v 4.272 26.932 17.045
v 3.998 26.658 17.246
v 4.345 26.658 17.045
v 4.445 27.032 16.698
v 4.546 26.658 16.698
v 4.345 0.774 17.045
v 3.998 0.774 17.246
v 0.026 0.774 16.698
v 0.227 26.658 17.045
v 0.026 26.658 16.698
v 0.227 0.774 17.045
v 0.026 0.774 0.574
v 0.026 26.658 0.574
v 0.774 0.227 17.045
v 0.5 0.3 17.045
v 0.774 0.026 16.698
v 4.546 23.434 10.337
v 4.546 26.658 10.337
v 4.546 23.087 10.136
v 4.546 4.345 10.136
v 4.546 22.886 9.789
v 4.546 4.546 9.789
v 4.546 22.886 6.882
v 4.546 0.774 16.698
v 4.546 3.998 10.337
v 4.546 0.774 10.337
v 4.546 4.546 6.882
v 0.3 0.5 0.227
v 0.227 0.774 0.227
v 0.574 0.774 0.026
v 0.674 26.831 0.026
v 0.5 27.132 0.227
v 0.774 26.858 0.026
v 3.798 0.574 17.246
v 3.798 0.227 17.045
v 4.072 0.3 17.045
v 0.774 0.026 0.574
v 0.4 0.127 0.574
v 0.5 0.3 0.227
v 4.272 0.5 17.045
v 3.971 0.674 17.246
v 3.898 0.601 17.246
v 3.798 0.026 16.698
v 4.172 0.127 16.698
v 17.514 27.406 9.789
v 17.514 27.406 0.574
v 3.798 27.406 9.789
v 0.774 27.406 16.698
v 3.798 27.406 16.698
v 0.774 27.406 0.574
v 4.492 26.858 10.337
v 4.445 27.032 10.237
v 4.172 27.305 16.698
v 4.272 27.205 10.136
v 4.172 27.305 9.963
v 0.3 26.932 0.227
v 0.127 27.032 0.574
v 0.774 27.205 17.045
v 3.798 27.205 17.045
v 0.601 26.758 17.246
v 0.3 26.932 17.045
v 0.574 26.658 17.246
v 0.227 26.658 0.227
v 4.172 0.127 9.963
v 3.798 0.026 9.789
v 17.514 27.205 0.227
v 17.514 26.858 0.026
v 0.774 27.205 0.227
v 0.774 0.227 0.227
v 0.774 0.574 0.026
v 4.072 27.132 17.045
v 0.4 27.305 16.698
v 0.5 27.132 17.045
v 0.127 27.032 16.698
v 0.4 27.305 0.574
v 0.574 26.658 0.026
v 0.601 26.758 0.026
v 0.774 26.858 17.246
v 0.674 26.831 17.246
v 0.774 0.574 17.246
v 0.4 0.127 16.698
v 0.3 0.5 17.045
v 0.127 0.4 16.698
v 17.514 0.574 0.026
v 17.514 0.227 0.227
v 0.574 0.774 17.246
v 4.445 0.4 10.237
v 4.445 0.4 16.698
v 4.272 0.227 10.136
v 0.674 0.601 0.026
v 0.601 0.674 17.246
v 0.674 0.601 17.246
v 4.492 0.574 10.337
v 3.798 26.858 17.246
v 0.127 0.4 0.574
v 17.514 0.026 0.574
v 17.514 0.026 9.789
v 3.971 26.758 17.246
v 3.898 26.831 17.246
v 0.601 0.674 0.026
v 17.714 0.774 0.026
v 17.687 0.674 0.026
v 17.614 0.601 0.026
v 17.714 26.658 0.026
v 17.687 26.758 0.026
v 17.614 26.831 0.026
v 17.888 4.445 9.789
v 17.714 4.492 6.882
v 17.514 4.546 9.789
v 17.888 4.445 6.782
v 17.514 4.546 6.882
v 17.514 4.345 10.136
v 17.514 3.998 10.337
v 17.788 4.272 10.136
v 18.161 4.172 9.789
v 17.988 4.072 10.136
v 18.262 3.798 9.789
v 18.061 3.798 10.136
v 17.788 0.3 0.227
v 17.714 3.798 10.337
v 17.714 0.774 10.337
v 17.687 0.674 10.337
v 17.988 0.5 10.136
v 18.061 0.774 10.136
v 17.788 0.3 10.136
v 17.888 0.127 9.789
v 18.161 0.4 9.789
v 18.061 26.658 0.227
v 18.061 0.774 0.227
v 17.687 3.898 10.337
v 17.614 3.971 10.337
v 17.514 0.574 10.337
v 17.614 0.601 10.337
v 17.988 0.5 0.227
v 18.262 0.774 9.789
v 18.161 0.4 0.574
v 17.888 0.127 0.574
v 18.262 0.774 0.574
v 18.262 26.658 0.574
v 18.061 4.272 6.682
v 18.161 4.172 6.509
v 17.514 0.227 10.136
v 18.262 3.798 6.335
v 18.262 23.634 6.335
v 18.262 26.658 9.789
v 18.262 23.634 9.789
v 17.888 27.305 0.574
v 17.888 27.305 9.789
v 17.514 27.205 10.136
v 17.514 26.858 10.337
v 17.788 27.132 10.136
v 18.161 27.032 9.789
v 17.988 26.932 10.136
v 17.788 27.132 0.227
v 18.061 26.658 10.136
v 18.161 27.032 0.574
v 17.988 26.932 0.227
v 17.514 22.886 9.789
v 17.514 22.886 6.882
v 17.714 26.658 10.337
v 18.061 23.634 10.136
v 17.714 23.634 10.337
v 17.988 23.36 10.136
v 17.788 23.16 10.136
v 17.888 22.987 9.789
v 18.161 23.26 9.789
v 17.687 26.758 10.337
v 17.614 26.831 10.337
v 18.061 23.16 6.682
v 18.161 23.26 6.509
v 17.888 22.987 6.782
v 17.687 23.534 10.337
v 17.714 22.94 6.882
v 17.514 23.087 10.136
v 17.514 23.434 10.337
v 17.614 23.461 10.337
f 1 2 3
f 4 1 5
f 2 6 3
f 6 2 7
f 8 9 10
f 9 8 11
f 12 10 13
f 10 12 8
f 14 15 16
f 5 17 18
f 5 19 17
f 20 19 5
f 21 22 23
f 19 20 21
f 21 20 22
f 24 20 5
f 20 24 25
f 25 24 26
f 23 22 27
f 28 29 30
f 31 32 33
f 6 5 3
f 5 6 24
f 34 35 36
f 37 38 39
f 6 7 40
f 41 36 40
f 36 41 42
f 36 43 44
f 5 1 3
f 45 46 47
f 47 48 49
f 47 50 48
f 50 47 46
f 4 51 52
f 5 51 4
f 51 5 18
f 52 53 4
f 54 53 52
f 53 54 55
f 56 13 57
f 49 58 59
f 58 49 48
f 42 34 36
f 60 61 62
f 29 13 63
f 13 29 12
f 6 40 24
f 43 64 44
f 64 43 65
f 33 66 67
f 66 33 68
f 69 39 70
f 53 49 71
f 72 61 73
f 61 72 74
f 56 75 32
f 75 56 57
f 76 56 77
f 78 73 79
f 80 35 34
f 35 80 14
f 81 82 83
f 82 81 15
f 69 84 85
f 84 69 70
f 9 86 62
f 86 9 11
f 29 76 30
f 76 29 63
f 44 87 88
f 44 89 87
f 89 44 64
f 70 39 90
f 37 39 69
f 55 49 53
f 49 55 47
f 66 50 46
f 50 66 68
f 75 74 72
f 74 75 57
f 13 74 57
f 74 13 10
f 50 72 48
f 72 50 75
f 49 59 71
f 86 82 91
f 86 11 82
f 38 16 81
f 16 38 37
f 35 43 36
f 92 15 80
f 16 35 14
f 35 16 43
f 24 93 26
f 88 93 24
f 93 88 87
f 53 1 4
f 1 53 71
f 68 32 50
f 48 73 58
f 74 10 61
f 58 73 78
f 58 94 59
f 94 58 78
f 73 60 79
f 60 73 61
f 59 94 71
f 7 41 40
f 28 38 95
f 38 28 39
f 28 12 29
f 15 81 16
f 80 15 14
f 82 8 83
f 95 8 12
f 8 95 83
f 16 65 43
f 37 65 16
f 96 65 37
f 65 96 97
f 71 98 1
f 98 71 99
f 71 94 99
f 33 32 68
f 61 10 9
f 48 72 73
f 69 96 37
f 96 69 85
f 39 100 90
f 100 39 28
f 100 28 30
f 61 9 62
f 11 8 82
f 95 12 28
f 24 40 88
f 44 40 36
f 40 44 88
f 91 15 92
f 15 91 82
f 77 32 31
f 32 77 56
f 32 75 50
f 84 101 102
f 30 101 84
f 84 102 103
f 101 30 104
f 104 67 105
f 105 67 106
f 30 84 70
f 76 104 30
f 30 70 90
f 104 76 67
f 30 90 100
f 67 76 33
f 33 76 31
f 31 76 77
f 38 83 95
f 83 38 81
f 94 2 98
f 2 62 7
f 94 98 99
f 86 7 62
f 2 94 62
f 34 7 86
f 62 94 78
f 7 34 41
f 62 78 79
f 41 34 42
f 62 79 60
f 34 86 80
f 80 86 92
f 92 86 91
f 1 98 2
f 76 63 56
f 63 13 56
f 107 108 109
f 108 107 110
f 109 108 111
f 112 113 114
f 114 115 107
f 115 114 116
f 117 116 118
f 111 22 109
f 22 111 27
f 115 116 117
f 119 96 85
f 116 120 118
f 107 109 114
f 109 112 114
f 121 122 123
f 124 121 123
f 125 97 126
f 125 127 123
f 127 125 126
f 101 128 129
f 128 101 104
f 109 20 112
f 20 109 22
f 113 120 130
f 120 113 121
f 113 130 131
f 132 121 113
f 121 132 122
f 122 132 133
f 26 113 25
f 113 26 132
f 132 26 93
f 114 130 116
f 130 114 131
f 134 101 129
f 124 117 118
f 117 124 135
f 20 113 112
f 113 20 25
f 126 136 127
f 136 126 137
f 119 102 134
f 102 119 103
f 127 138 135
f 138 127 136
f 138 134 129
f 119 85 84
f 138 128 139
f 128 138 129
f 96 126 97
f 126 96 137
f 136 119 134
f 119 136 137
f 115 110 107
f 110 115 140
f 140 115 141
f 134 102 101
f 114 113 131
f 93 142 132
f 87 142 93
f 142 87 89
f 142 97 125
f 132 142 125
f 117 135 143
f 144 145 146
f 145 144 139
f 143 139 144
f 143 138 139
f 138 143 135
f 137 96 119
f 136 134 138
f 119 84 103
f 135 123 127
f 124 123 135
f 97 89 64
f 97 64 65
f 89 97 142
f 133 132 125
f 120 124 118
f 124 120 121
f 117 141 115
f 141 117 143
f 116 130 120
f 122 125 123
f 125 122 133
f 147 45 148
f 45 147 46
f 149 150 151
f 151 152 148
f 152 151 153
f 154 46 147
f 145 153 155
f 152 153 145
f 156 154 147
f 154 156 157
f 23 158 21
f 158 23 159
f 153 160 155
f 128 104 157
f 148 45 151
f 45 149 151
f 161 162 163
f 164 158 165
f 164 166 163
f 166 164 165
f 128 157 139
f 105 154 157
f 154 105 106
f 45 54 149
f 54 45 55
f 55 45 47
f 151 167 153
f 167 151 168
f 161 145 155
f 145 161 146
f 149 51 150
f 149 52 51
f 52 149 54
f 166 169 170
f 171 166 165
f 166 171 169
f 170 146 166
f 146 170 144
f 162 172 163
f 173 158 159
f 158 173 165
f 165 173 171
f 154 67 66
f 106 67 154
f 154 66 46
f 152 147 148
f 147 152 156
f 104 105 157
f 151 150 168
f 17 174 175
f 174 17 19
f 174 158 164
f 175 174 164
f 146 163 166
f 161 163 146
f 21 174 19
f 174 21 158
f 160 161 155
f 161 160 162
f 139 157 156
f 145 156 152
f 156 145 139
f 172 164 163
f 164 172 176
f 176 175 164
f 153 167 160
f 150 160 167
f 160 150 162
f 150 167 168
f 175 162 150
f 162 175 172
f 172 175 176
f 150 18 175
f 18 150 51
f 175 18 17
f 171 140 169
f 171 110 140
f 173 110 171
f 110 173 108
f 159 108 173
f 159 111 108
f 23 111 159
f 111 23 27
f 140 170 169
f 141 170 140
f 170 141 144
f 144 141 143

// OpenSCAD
// mathgrrl parametrizable furniture
// CODE FOR THINGIVERSE CUSTOMIZER

////////////////////////////////////////////////////////////////////////////

/* [Units and Scaling] */

// Choose the type of units that you will use to measure your actual room and objects.
units = 25.4; // [25.4:Inches,304.8:Feet,10:Centimeters,1000:Meters]

// Choose the scale of your models. For example "50" means 1:50 scale, with models whose linear dimensions are 1/50th of their actual size.
scale = 50;  

// Invisible parameters
$fn = 1*12; 	// facets
s = units/scale;	// scaling factor 
soft = 3*s;	// radius for soft bevels depends on scale
sharp = 1*.2; 	// radius for sharper edges

////////////////////////////////////////////////////////////////////////////

/* [Furniture Type] */

//Choose a type of custom or stock furniture from ONE of the four menus below. Enter your custom dimensions on the next tab. Stock models come with their own dimensions.
custom_furniture = 0; //	[0:None,1:Bookcase in my dimensions,2:Table in my dimensions,3:Desk in my dimensions,4:Corner Desk in my dimensions,5:Chair in my dimensions,6:Stool in my dimensions,7:Sofa in my dimensions,8:Sofa Bed in my dimensions,9:Ottoman in my dimensions,10:Bed in my dimensions,11:Bed Frame in my dimensions,12:Bureau in my dimensions,13:Rug in my dimensions,14:Lamp in my dimensions,15:Tree in my dimensions,16:Arcade in my dimensions,17:Clearance token in my dimensions]

// 
stock_bookcase_selection = 100; // [100:None,101:Wide short IKEA Billy bookcase,102:Wide short extended IKEA Billy bookcase,103:Wide tall IKEA Billy Bookcase,104:Wide tall extended IKEA Billy bookcase,105:Wide tall deep IKEA Billy bookcase,106:Thin short IKEA Billy bookcase,107:Thin short extended IKEA Billy bookcase,108:Thin tall IKEA Billy bookcase,109:Thin tall extended IKEA Billy bookcase,110:Wide tall IKEA Hemnes bookcase,111:Thin tall IKEA Hemnes bookcase,112:Wide tall IKEA Bonde bookcase,113:Thin tall IKEA Bonde bookcase]

// 
stock_bed_selection = 300; // [300:None,301:Twin matrress,302:Frame for twin mattress,303:Full mattress,304:Frame for full mattress,305:Queen mattress,306:Frame for queen mattress,307:King mattress,308:Frame for king mattress,309:IKEA Karlstad sofa bed]

// 
other_stock_selection = 516; // [500:None,501:Small dining table,502:Medium dining table,503:Coffee table,504:Square coffee table,505:Kid's desk,506:Large desk,507:Long desk,508:TV stand,509:Tiny endtable,510:Medium endtable,511:Large endtable,512:Dining chair,513:Office chair,514:Kitchen stool,515:Large sofa,516:Small loveseat,517:Armchair,518:Kid's bureau,519:Large rug,520:Standing lamp,521:Decorative tree,522:Galaga/PacMan arcade,523:Thin clearance token,524:Wide clearance token]

////////////////////////////////////////////////////////////////////////////

/* [Dimensions] */

// What is the length of your object from side to side? (The model may appear on its back or side; answer in terms of the real-life object.)
length = 30;

// What is the depth of your object from front to back?
depth = 30;

// What is the height of your object from bottom to top?
height = 30;

// If your object is a stool, tree, or lamp then enter radius here to be used instead of length and depth.
radius = 7;

// If your object is a bookcase, how many shelves does it have?
shelves = 4;

// If your object is a bureau, how many levels of drawers does it have?
drawers = 4;

// If your object is a chair, which type of chair is it?
chair_type = 1000; // [1000:Straight,1001:Rolling]

// If your object is a sofa bed, what is its depth when fully extended?
sofabed_depth = 65;

////////////////////////////////////////////////////////////////////////////
// choose and render the furntiture model //////////////////////////////////

furniture(); // build it!

module furniture(){

	// custom designs with user dimensions
	if (custom_furniture==1) bookcase(depth,length,height,shelves);
	if (custom_furniture==2) table(depth,length,height);
	if (custom_furniture==3) desk(depth,length,height);
	if (custom_furniture==4) cornerdesk(depth,length,height);
	if (custom_furniture==5) chair(depth,length,height,chair_type);
	if (custom_furniture==6) stool(radius,height);
	if (custom_furniture==7) sofa(depth,length,height);
	if (custom_furniture==8) sofabed(depth,sofabed_depth,length,height);
	if (custom_furniture==9) ottoman(depth,length,height);
	if (custom_furniture==10) bed(depth,length,height);
	if (custom_furniture==11) bedframe(depth,length,height);
	if (custom_furniture==12) bureau(depth,length,height,drawers);
	if (custom_furniture==13) rug(width,length);
	if (custom_furniture==14) lamp(radius,height);
	if (custom_furniture==15) tree(radius,height);
	if (custom_furniture==16) arcade(depth,length,height);
	if (custom_furniture==17) clearance_star(length,height);

	// pre-made bookcases
	if (stock_bookcase_selection==101) bookcase(depth=11,length=31.5,height=41.75,shelves=3);
	if (stock_bookcase_selection==102) bookcase(depth=11,length=31.5,height=55.375,shelves=4);
	if (stock_bookcase_selection==103) bookcase(depth=11,length=31.5,height=79.5,shelves=6);
	if (stock_bookcase_selection==104) bookcase(depth=11,length=31.5,height=93.125,shelves=7);
	if (stock_bookcase_selection==105) bookcase(depth=15.375,length=31.5,height=79.5,shelves=6);
	if (stock_bookcase_selection==106) bookcase(depth=11,length=15.75,height=41.75,shelves=3);
	if (stock_bookcase_selection==107) bookcase(depth=11,length=15.75,height=55.375,shelves=4);
	if (stock_bookcase_selection==108) bookcase(depth=11,length=15.75,height=79.5,shelves=6);
	if (stock_bookcase_selection==109) bookcase(depth=11,length=15.75,height=93.125,shelves=7);
	if (stock_bookcase_selection==110) bookcase(depth=13.5,length=35.5,height=78,shelves=6);
	if (stock_bookcase_selection==111) bookcase(depth=13.5,length=19.5,height=78,shelves=6);
	if (stock_bookcase_selection==112) bookcase(depth=16,length=28.5,height=58,shelves=4);
	if (stock_bookcase_selection==113) bookcase(depth=16,length=14.5,height=58,shelves=4);

	// pre-made beds
	if (stock_bed_selection==301) bed(depth=39,length=75,height=20); 
	if (stock_bed_selection==302) bedframe(depth=43,length=81.5,height=17); 
	if (stock_bed_selection==303) bed(depth=54,length=75,height=20);
	if (stock_bed_selection==304) bedframe(depth=57,length=81.5,height=17);
	if (stock_bed_selection==305) bed(depth=60,length=80,height=20); 
	if (stock_bed_selection==306) bedframe(depth=64,length=86.5,height=17); 
	if (stock_bed_selection==307) bed(depth=76,length=80,height=20);
	if (stock_bed_selection==308) bedframe(depth=80,length=86.5,height=17);
	if (stock_bed_selection==309) sofabed(depth=36.625,depth2=55.125+7,length=78.75+10,height=32.625);

	// other pre-made models
	if(other_stock_selection==501) table(depth=33,length=55,height=29); // small dining table
	if(other_stock_selection==502) table(depth=33,length=71,height=29); // medium dining table
	if(other_stock_selection==503) table(depth=24,length=46.5,height=18); // coffee table
	if(other_stock_selection==504) table(depth=35.5,length=35.5,height=18); // square coffee table
	if(other_stock_selection==505) desk(depth=21,length=42,height=29.5); // kid's desk
	if(other_stock_selection==506) desk(depth=29.5,length=55,height=30); // large desk
	if(other_stock_selection==507) desk(depth=24,length=75.5,height=29); // long desk
	if(other_stock_selection==508) bookcase(depth=21.5,length=60,height=20.5,shelves=1); // TV stand
	if(other_stock_selection==509) desk(depth=12,length=12,height=24); // tiny endtable
	if(other_stock_selection==510) desk(depth=15,length=23,height=23); // medium endtable
	if(other_stock_selection==511) bookcase(depth=24,length=28,height=22,shelves=1); // large endtable
	if(other_stock_selection==512) chair(depth=23,length=17,height=40,chair_type=1000); // dining chair
	if(other_stock_selection==513) chair(depth=21,length=23,height=44.5,chair_type=1001); // office chair
	if(other_stock_selection==514) stool(radius=7.25,height=29); // kitchen stool
	if(other_stock_selection==515) sofa(depth=39,length=90,height=32); // large sofa
	if(other_stock_selection==516) sofa(depth=36,length=54,height=34); // small loveseat
	if(other_stock_selection==517) sofa(depth=36,length=35,height=34); // armchair
	if(other_stock_selection==518) bureau(depth=17,length=37,height=36,drawers=4); // kid's bureau
	if(other_stock_selection==519) rug(width=79,length=116); // large rug
	if(other_stock_selection==520) lamp(radius=7,height=70); // standing lamp
	if(other_stock_selection==521) tree(radius=18,height=75); // decorative tree
	if(other_stock_selection==522) arcade(depth=31,length=25,height=70.5); // Galaga/PacMan arcade
	if(other_stock_selection==523) clearance_star(length=22,height=72); // limited access clearance
	if(other_stock_selection==524) clearance_star(length=30,height=72); // regular access clearance
}

////////////////////////////////////////////////////////////////////////////
// module for cuboids //////////////////////////////////////////////////////
// thanks, kitwallace! /////////////////////////////////////////////////////

module cuboid(depth,length,height,r) {
	hull(){
		translate([r,r,r]) sphere(r);
		translate([depth-r,r,r]) sphere(r);
		translate([depth-r,length-r,r]) sphere(r);
		translate([r,length-r,r]) sphere(r);
		translate([r,length-r,height-r]) sphere(r);
		translate([depth-r,length-r,height-r]) sphere(r);
		translate([depth-r,r,height-r]) sphere(r);
		translate([r,r,height-r]) sphere(r);
	}
}

////////////////////////////////////////////////////////////////////////////
// module for making bookcases /////////////////////////////////////////////

module bookcase(depth,length,height,shelves){
	scale(s)
	union(){
		difference(){
			// body of the bookcase
			cuboid(length,height,depth,sharp);
			// minus an inside
			translate([.1*length,.1*length,-depth/2])
				cuboid(.8*length,height-.2*length,2*depth,sharp);
		}
		// put in some shelves
		for (i = [1:1:shelves-1]){
			translate([0,i*(height-.1*length)/shelves,0]) 
				cuboid(length,.1*length,depth,sharp);
		}
	}
}

////////////////////////////////////////////////////////////////////////////
// module for making tables ////////////////////////////////////////////////

module table(depth,length,height){
	scale(s)
	union(){
		// top of table
		cuboid(depth,length,depth/5,sharp);
		// four legs
		translate([0,0,0]) cuboid(depth/5,depth/5,height,sharp);
		translate([depth-depth/5,0,0]) cuboid(depth/5,depth/5,height,sharp);
		translate([0,length-depth/5,0]) cuboid(depth/5,depth/5,height,sharp);
		translate([depth-depth/5,length-depth/5,0]) cuboid(depth/5,depth/5,height,sharp);
	}
}

////////////////////////////////////////////////////////////////////////////
// module for making desks /////////////////////////////////////////////////

module desk(depth,length,height){
	scale(s)
	rotate(270,[0,1,0])
	union(){
		// top of desk
		translate([0,0,height*.8]) cuboid(depth,length,height*.2,sharp);
		// left side
		cuboid(depth,length*.15,height,sharp);
		// right side
		translate([0,length*.85,0]) cuboid(depth,length*.15,height,sharp);
	}
}

////////////////////////////////////////////////////////////////////////////
// module for making corner desks //////////////////////////////////////////

module cornerdesk(depth,length,height){
	scale(s)
	translate([0,0,height]) rotate(180,[0,1,0])
	difference(){
		// regular desk
		union(){
			// top of desk
			translate([0,0,height*.8]) cuboid(depth,length,height*.2,sharp);
			// left side
			cuboid(depth,length*.15,height,sharp);
			// right side
			translate([0,length*.85,0]) cuboid(depth,length*.15,height,sharp);
		}
		// take out a corner circle
		translate([0,0,-1]) cylinder(r=depth/2,h=height+2);
	}
}

////////////////////////////////////////////////////////////////////////////
// module for chairs ////////////////////////////////////////////////////////

module chair(depth,length,height,chair_type){
	scale(s)
	rotate(90,[1,0,0])
	union(){
		// top of chair
		if (chair_type==1000) // straight desk chair
			translate([0,0,height*.4]) 
				cuboid(depth,length,height*.1,sharp);
		if (chair_type==1001) // rolling office chair
			translate([0,0,height*.4]) 
				cuboid(depth,length,height*.1,soft);
		// back
		if (chair_type==1000) // straight desk chair
			cuboid(depth*.15,length,height,sharp);
		if (chair_type==1001) // rolling office chair
			translate([0,0,height*.4]) 
				cuboid(depth*.15,length,height*.6,soft);
		// front
		if (chair_type==1000) // straight desk chair
			translate([depth*.85,0,0]) 
				cuboid(depth*.15,length,height*.5,sharp);
		if (chair_type==1001) // rolling office chair
			union(){
				translate([depth*.85/2,0,0]) 
					cuboid(depth*.15,length,height*.45,sharp);
				translate([depth/2,length/2,0]) 
					cylinder(r=length/2,h=height*.1);
			}
	}
}

////////////////////////////////////////////////////////////////////////////
// module for stools ///////////////////////////////////////////////////////

module stool(radius,height){
	scale(s)
	union(){
		// top
		cylinder(r=radius,h=height*.1);
		// legs
		rotate(0,[0,0,1])
			translate([radius*.6,0,0]) 
				cylinder(r=radius*.3,h=height);
		rotate(90, [0,0,1])
			translate([radius*.6,0,0]) 
				cylinder(r=radius*.3,h=height);
		rotate(180, [0,0,1])
			translate([radius*.6,0,0]) 
				cylinder(r=radius*.3,h=height);
		rotate(270, [0,0,1])
			translate([radius*.6,0,0]) 
				cylinder(r=radius*.3,h=height);
	}
}

////////////////////////////////////////////////////////////////////////////
// module for making sofas /////////////////////////////////////////////////

module sofa(depth,length,height){
	scale(s)
	union(){
		// back of sofa
		cuboid(depth/4,length,height,soft);
		// left arm of sofa
		cuboid(depth,depth/4,height*.6,soft);
		// right arm of sofa
		translate([0,length-depth/4,0]) cuboid(depth,depth/4,height*.6,soft);
		// cushions of sofa
		cuboid(depth,length,height*.4,soft);
	}
}

////////////////////////////////////////////////////////////////////////////
// module for making sofa beds /////////////////////////////////////////////

module sofabed(depth,sofabed_depth,length,height){
	scale(s)
	union(){
		// back of sofa
		cuboid(depth/4,length,height,soft);
		// left arm of sofa
		cuboid(depth,depth/4,height*.6,soft);
		// right arm of sofa
		translate([0,length-depth/4,0]) cuboid(depth,depth/4,height*.6,soft);
		// cushions of sofa
		cuboid(depth,length,height*.4,soft);
		// image of bed
		cuboid(sofabed_depth,length,height*.1,soft);
	}
}

////////////////////////////////////////////////////////////////////////////
// module for making ottomans //////////////////////////////////////////////

module ottoman(depth,length,height){
	scale(s)
	cuboid(depth,length,height,soft);
}

////////////////////////////////////////////////////////////////////////////
// module for making beds //////////////////////////////////////////////////

module bed(depth,length,height){
	scale(s)
	union(){
		// mattress
		cuboid(depth,length,height,soft);
		// pillow
		cuboid(depth,.2*length,1.2*height,soft);
	}
}

////////////////////////////////////////////////////////////////////////////
// module for making bed frames ////////////////////////////////////////////

module bedframe(depth,length,height){
	scale(s)
	difference(){
		// total outer size
		cuboid(depth,length,height,sharp);
		// take out inside
		translate([2,2,-1]) cuboid(depth-4,length-4,height+2,sharp);
	}
}

////////////////////////////////////////////////////////////////////////////
// module for bureaus //////////////////////////////////////////////////////

module bureau(depth,length,height,drawers){
	scale(s)
	union(){
		// body of the bureau
		cuboid(length,height,depth,sharp);
		// put in some drawers
		for (i = [1:1:drawers]){
			translate([.075*length,i*(height-.1*height)/drawers-.15*height,0]) 
				cuboid(.4*length,.15*height,depth*1.1,sharp);
			translate([.525*length,i*(height-.1*height)/drawers-.15*height,0]) 
				cuboid(.4*length,.15*height,depth*1.1,sharp);
		}
	}
}

////////////////////////////////////////////////////////////////////////////
// module for rugs ////////////////////////////////////////////////////////

module rug(width,length){
	scale(s)
	cuboid(width,length,soft,sharp);
}

////////////////////////////////////////////////////////////////////////////
// module for lamps ////////////////////////////////////////////////////////

module lamp(radius,height){
	scale(s)
	union(){
		// top
		translate([0,0,height*.8])
			cylinder(r1=radius*.5,r2=radius,h=height*.2);
		// leg
		cylinder(r=radius*.4,h=height*.8);
		// base
		cylinder(r=radius,h=height*.1);
	}
}

////////////////////////////////////////////////////////////////////////////
// module for trees ////////////////////////////////////////////////////////

module tree(radius,height){
	scale(s)
	union(){
		// branches
		translate([0,0,height*.5]) 
			rotate(40,[1,0,0]) 
				cylinder(r=radius*.2,h=height*.5);
		translate([0,0,height*.5]) 
			rotate(200,[0,0,1]) rotate(40,[1,0,0]) 
				cylinder(r=radius*.2,h=height*.5);
		translate([0,0,height*.4]) 
			rotate(80,[0,0,1]) rotate(50,[1,0,0]) 
				cylinder(r=radius*.2,h=height*.3);
		translate([0,0,height*.6]) 
			rotate(140,[0,0,1]) rotate(405,[1,0,0]) 
				cylinder(r=radius*.2,h=height*.3);
		translate([0,0,height*.45]) 
			rotate(260,[0,0,1]) rotate(50,[1,0,0]) 
				cylinder(r=radius*.2,h=height*.3);
		translate([0,0,height*.8]) 
			rotate(100,[0,0,1]) rotate(30,[1,0,0]) 
				cylinder(r=radius*.2,h=height*.2);
		translate([0,0,height*.7]) 
			rotate(280,[0,0,1]) rotate(30,[1,0,0]) 
				cylinder(r=radius*.2,h=height*.3);
		// leg
		cylinder(r=radius*.2,h=height*.8);
		// base
		cylinder(r=radius*.8,h=height*.1);
	}
}

////////////////////////////////////////////////////////////////////////////
// module for arcade machine ///////////////////////////////////////////////

module arcade(depth,length,height){
	scale(s)
	rotate(-90,[0,1,0])
	difference(){
		// overall size of the machine
		cuboid(depth,length,height,sharp);
		// cutout for screen and controls
		translate([depth*.9,length*.9,height*.7]) 
			rotate(90,[1,0,0]) 
				cylinder(r=height*.25,h=length*.8);
	}
}

////////////////////////////////////////////////////////////////////////////
// module for clearance star ///////////////////////////////////////////////
// code modified from Catarina Mota's shape library ////////////////////////
// http://svn.clifford.at/openscad/trunk/libraries/shapes.scad /////////////

module 12ptstar(length,height) {
	starNum = 3;
	starAngle = 360/starNum;
	// place StarNum cubes rotated evenly
	for (s = [1:starNum]) {
		rotate([0, 0, s*starAngle]) cube([length/sqrt(2),length/sqrt(2),height], true);
  	}
}

module clearance_star(length,height) {
	scale(s)
	translate([0,0,height/2])
	difference(){
		12ptstar(length,height);
		12ptstar(length-6,height+2);
	}
}
